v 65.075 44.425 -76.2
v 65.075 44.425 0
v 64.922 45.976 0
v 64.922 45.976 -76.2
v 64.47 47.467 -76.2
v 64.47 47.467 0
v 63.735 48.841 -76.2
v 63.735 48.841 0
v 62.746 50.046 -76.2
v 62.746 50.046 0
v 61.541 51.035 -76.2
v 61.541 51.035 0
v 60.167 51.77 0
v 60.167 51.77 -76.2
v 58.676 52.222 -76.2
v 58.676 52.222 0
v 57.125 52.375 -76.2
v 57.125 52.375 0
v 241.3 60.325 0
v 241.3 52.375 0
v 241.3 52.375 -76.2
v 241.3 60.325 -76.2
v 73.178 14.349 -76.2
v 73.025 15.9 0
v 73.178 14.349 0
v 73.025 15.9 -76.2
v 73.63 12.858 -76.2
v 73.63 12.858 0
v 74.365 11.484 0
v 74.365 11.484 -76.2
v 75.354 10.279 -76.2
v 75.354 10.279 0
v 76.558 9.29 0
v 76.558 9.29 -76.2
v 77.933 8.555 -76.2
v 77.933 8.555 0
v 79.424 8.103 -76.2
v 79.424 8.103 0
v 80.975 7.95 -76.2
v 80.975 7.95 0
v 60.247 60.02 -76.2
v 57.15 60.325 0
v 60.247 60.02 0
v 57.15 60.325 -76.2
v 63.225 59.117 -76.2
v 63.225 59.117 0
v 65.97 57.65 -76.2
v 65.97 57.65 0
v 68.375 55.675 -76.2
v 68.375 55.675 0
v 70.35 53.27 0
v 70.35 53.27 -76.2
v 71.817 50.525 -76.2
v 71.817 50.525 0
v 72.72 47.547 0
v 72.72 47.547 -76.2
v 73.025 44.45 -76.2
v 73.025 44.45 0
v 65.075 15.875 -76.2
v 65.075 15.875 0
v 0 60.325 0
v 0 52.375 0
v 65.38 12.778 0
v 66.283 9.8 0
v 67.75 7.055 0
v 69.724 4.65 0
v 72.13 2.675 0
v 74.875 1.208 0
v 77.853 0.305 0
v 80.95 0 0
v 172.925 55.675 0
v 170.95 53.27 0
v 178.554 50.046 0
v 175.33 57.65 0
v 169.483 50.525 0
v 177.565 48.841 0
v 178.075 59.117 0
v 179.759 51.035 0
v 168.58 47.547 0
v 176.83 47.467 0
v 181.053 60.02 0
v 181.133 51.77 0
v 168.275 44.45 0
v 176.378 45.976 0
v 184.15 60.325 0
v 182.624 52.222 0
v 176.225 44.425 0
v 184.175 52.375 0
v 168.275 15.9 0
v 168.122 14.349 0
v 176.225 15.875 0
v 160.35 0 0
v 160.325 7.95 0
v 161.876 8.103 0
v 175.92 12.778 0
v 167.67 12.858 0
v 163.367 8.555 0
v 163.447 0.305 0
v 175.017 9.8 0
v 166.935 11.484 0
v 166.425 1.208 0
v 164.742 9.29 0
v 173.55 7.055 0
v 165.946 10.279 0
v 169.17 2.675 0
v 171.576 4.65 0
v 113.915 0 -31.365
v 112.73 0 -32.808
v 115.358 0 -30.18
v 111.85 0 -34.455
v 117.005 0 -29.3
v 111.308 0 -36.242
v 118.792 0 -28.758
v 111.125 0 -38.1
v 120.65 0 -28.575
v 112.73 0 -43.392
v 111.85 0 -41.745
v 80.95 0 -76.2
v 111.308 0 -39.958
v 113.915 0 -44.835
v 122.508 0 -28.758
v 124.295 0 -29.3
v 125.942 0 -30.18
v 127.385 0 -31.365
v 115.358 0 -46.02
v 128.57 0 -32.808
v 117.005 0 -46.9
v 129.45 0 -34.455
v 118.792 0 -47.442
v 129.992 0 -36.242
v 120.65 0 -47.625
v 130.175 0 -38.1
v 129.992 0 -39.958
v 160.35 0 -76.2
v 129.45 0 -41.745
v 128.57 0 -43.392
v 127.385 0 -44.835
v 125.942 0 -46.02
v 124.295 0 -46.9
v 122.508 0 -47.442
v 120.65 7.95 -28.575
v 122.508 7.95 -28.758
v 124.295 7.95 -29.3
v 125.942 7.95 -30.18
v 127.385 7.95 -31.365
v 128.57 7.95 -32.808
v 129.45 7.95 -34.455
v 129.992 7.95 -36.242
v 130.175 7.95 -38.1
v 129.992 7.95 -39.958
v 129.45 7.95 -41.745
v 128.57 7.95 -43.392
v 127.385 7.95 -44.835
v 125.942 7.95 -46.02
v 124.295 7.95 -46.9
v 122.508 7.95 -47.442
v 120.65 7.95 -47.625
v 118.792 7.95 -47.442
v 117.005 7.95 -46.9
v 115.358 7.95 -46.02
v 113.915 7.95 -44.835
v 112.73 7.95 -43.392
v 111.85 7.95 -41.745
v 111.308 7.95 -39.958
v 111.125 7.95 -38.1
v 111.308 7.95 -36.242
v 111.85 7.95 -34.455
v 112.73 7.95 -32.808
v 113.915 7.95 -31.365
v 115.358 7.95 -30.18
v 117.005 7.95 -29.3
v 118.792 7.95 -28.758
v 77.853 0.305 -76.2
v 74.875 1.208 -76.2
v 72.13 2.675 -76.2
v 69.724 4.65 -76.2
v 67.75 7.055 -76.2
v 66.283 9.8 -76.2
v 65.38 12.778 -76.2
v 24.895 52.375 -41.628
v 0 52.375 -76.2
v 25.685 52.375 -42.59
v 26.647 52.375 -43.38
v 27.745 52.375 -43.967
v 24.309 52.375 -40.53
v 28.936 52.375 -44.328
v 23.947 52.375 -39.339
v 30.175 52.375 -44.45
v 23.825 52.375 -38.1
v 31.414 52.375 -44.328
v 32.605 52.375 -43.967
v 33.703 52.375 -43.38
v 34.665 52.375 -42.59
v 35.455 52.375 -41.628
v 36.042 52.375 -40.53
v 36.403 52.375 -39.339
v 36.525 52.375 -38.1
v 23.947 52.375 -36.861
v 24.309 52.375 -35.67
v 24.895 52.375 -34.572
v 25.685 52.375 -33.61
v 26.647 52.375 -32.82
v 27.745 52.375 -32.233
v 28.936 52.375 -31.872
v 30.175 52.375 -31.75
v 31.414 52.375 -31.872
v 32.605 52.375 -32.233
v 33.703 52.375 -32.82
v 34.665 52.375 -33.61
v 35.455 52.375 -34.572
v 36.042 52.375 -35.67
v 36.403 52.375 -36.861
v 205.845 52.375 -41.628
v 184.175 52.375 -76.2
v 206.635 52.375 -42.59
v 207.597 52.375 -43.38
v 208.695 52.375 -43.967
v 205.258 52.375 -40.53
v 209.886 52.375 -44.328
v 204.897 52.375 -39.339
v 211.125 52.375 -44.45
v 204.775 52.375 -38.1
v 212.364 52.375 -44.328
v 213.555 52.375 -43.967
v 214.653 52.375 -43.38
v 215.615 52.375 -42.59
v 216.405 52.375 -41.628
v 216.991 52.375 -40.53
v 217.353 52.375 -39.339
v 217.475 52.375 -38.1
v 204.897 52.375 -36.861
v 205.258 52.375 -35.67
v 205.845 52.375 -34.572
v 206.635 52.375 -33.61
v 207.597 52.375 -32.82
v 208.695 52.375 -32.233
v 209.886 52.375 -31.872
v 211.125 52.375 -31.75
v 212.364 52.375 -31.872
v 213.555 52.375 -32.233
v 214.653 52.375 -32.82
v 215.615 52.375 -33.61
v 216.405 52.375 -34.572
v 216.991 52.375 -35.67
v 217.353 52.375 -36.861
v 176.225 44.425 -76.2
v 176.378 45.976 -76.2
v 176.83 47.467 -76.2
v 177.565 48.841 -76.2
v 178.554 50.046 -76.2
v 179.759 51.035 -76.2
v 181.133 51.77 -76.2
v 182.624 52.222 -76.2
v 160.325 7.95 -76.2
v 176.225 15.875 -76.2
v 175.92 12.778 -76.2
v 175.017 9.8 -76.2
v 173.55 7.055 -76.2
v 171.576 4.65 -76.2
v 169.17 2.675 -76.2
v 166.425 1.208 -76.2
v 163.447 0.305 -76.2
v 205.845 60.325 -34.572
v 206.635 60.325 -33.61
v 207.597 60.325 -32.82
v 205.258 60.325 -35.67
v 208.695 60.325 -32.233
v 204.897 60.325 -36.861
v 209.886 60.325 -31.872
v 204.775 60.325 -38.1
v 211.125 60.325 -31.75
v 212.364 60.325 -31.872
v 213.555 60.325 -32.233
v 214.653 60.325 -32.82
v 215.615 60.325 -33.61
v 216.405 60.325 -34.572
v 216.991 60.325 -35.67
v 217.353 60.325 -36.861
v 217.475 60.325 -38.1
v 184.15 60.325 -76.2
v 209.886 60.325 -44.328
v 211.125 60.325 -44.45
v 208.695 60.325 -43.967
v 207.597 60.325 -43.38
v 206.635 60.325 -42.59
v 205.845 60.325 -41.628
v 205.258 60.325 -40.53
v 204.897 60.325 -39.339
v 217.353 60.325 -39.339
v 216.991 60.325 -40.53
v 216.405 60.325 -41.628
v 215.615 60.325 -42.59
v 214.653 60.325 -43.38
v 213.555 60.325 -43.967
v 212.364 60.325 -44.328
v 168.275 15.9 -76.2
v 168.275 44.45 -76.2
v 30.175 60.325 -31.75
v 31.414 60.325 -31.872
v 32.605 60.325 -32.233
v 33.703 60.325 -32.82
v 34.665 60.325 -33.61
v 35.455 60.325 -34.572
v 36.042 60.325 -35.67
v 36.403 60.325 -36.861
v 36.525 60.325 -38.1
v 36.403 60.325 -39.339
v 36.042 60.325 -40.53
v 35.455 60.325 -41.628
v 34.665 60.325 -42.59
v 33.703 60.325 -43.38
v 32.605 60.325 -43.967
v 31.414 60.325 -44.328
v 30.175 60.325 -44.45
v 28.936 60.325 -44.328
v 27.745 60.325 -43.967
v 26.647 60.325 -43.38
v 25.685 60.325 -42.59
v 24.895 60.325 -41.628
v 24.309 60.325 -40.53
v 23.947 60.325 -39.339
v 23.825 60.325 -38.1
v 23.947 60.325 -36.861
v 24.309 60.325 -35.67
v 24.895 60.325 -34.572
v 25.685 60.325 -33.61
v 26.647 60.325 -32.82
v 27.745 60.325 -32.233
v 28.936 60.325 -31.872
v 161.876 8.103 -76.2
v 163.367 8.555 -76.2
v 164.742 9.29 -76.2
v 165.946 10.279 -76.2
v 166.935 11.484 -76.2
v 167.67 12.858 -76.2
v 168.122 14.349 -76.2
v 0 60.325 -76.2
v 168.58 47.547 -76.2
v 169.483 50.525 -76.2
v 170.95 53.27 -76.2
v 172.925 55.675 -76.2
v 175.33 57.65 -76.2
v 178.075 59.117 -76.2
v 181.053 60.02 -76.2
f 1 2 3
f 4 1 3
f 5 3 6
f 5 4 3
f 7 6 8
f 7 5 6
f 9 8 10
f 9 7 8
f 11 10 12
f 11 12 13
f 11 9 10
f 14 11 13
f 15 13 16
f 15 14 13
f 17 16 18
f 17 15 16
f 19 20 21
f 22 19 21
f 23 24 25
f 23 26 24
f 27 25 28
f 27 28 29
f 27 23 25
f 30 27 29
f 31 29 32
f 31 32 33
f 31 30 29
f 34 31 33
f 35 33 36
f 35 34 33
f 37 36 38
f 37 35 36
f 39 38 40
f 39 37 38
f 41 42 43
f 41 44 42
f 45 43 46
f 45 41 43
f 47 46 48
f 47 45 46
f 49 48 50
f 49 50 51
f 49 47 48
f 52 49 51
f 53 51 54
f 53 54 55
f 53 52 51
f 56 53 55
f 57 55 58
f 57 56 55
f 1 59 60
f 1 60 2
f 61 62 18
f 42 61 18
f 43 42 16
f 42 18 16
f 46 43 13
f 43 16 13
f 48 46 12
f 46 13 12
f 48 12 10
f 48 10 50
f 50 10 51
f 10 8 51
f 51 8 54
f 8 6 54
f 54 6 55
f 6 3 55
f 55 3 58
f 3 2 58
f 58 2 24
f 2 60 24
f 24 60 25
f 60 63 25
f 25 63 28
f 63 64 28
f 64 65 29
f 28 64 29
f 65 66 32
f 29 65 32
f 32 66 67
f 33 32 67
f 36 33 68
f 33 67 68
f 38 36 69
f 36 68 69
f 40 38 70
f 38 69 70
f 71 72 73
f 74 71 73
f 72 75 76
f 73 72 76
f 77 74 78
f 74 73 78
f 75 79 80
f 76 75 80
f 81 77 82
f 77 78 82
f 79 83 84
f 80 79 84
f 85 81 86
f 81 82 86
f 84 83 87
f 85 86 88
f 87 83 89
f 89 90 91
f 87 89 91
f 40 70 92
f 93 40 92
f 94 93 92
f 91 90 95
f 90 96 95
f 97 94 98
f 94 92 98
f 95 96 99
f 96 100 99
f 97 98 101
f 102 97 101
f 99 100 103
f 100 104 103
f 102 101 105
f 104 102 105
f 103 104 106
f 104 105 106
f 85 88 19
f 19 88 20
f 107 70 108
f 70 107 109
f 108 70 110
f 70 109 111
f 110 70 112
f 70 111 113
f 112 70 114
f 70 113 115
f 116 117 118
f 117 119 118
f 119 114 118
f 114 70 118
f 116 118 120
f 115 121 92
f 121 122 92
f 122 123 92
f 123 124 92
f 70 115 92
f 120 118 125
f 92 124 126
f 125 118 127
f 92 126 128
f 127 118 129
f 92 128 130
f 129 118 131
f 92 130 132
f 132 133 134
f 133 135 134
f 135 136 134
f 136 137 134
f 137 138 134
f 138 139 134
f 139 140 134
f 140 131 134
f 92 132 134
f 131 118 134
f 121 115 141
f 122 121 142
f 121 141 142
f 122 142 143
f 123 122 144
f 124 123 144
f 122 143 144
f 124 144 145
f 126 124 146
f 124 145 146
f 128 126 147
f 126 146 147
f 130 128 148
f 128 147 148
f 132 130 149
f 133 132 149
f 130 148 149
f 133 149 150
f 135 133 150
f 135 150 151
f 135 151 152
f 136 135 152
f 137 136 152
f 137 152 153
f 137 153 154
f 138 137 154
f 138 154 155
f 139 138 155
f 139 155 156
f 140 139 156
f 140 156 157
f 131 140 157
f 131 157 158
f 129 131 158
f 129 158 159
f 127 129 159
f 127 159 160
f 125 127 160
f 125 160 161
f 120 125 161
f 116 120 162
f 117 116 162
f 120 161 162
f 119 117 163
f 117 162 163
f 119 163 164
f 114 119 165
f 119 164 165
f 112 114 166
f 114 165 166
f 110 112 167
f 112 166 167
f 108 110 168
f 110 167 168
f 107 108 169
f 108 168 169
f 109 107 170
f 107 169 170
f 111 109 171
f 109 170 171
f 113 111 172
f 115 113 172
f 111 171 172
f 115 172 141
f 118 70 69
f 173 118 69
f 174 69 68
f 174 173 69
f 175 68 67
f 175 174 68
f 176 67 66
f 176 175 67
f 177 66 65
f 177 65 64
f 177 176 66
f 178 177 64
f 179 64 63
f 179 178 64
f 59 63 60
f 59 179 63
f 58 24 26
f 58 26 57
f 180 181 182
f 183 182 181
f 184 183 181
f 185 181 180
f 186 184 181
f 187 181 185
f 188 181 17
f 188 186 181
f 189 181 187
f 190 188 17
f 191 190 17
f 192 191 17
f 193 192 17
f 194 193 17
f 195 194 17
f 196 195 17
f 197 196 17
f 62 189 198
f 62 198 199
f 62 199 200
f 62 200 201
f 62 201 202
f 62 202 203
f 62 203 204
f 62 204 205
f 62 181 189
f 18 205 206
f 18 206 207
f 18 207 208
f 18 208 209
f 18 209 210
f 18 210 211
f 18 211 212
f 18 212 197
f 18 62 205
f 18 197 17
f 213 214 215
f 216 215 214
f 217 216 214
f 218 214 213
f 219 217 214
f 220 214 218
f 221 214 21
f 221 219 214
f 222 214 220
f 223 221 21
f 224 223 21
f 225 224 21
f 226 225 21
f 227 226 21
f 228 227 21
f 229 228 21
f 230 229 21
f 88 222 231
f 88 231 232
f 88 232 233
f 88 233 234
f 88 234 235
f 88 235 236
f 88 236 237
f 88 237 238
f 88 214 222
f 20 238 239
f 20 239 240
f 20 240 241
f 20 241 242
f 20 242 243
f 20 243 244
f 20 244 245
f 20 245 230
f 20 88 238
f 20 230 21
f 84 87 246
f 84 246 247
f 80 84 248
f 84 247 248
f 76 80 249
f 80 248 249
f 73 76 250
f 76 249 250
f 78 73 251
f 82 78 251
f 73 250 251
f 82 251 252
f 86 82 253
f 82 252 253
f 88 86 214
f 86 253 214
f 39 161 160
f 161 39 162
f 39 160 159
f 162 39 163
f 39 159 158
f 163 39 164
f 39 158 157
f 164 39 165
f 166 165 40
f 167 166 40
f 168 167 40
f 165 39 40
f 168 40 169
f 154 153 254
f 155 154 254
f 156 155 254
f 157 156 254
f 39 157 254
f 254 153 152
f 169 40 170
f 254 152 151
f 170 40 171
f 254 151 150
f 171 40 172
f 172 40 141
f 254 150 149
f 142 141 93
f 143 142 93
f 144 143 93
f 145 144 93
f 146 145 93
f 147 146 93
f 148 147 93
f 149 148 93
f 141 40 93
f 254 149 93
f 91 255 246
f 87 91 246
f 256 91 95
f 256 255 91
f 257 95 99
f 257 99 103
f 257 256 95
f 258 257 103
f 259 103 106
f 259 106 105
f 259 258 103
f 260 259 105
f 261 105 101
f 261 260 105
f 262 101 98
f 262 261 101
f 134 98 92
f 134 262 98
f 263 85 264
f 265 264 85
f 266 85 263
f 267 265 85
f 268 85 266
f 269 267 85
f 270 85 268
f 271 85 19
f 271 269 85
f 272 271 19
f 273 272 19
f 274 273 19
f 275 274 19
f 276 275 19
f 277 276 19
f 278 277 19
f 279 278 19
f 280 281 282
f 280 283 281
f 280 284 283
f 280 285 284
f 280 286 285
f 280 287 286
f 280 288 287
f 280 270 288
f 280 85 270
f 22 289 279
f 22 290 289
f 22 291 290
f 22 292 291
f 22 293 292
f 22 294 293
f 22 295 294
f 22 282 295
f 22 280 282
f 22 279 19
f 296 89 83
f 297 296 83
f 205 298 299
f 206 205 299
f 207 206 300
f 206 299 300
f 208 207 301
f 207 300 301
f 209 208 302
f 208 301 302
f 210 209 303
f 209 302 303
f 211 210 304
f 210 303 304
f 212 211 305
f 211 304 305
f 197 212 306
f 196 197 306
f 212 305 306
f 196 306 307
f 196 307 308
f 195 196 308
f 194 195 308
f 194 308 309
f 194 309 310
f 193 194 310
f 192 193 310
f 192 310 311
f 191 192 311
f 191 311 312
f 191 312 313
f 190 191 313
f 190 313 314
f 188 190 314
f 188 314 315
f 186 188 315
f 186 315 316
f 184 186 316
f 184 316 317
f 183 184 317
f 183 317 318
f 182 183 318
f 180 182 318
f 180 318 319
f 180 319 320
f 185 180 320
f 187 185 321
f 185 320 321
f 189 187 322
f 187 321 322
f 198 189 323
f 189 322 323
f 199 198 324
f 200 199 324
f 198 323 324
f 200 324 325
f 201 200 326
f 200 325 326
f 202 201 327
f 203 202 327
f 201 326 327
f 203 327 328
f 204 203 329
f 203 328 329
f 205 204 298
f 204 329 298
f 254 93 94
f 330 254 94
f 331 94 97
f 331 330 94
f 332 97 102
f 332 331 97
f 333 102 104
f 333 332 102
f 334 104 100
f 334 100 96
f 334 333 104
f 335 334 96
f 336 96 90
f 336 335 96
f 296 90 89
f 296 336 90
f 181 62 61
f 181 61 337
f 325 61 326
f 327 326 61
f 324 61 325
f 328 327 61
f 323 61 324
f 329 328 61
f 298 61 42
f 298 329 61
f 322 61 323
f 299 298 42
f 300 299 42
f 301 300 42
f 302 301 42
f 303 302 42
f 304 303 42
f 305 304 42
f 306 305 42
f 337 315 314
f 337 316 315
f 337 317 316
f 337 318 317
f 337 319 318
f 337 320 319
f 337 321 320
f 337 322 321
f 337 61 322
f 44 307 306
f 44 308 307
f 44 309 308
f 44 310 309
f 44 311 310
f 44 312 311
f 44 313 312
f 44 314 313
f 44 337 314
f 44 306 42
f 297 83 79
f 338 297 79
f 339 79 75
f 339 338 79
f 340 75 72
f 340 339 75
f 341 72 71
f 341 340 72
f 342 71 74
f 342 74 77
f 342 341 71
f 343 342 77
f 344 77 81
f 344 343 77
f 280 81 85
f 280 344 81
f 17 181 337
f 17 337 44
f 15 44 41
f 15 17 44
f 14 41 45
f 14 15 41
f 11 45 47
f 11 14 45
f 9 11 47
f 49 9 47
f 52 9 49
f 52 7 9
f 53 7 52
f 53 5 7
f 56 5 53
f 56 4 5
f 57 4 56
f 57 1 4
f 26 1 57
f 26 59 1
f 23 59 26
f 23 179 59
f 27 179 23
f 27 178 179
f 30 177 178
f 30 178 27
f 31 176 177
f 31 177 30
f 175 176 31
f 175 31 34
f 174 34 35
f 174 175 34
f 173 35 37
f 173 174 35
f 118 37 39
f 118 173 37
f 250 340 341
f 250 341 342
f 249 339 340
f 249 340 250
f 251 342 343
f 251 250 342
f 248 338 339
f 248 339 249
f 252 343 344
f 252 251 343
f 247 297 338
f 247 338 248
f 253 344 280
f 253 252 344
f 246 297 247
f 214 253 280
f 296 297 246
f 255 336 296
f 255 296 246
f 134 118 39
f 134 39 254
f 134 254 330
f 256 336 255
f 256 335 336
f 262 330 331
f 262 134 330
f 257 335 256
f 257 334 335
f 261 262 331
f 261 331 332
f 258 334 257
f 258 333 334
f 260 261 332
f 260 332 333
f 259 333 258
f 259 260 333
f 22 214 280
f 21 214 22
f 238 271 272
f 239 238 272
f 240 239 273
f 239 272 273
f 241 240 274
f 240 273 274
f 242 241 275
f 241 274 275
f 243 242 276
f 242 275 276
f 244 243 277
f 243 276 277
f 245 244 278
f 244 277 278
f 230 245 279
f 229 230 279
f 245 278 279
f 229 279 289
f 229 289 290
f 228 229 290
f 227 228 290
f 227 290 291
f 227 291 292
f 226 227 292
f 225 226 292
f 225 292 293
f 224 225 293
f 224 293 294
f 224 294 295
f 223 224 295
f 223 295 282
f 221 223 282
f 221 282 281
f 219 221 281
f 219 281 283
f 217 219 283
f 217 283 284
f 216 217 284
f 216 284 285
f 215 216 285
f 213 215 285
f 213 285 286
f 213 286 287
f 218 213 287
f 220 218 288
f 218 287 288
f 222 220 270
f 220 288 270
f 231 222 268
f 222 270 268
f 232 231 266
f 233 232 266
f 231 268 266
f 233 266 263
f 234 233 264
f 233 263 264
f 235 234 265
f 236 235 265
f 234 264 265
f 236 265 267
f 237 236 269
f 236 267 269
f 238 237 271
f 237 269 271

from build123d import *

# Parameters (mm, degrees)
SKETCH1_W           = 241.3
SKETCH1_H           = 76.2
BOSS_EXTRUDE1_DEPTH = 60.325
SKETCH3_W           = 65.0748
SKETCH3_H           = 52.3748
CUT_EXTRUDE4_DEPTH  = 261.136955516
SKETCH6_W           = 95.25
SKETCH6_H           = 52.3748
CUT_EXTRUDE5_DEPTH  = 261.136955516
SKETCH7_W           = 65.0748
SKETCH7_H           = 52.3748
CUT_EXTRUDE6_DEPTH  = 261.136955516
SKETCH8_R           = 6.35
CUT_EXTRUDE7_DEPTH  = 261.136955516
SKETCH9_R           = 9.525
CUT_EXTRUDE8_DEPTH  = 261.136955516
FILLET1_R           = 15.875
FILLET2_R           = 7.9502
FILLET3_R           = 7.9502
FILLET4_R           = 15.875
FILLET5_R           = 15.875
FILLET6_R           = 15.875
FILLET7_R           = 7.9502
FILLET8_R           = 7.9502


with BuildPart() as part:
    # Sketch1 → Boss-Extrude1 (new body)
    with BuildSketch(Plane(origin=(0, 0, 0), x_dir=(1, 0, 0), z_dir=(0, 1, 0))):
        with Locations((120.65, 38.1)):
            Rectangle(SKETCH1_W, SKETCH1_H)
    extrude(amount=BOSS_EXTRUDE1_DEPTH)

    # Sketch3 → Cut-Extrude4 (cut, through all)
    with BuildSketch(Plane.XY):
        with Locations((208.7626, 26.1874)):
            Rectangle(SKETCH3_W, SKETCH3_H)
    extrude(amount=-CUT_EXTRUDE4_DEPTH, mode=Mode.SUBTRACT)

    # Sketch6 → Cut-Extrude5 (cut, through all)
    with BuildSketch(Plane.XY):
        with Locations((120.65, 34.1376)):
            Rectangle(SKETCH6_W, SKETCH6_H)
    extrude(amount=-CUT_EXTRUDE5_DEPTH, mode=Mode.SUBTRACT)

    # Sketch7 → Cut-Extrude6 (cut, through all)
    with BuildSketch(Plane.XY):
        with Locations((32.5374, 26.1874)):
            Rectangle(SKETCH7_W, SKETCH7_H)
    extrude(amount=-CUT_EXTRUDE6_DEPTH, mode=Mode.SUBTRACT)

    # Sketch8 → Cut-Extrude7 (cut, through all)
    with BuildSketch(Plane(origin=(0, 60.325, 0), x_dir=(1, 0, 0), z_dir=(0, 1, 0))):
        with Locations(Location((30.1752, 38.1, 0), (0, 0, 270))):
            Circle(SKETCH8_R)
        with Locations(Location((211.1248, 38.1, 0), (0, 0, 270))):
            Circle(SKETCH8_R)
    extrude(amount=-CUT_EXTRUDE7_DEPTH, mode=Mode.SUBTRACT)

    # Sketch9 → Cut-Extrude8 (cut, through all)
    with BuildSketch(Plane(origin=(0, 60.325, 0), x_dir=(1, 0, 0), z_dir=(0, 1, 0))):
        with Locations(Location((120.65, 38.1, 0), (0, 0, 270))):
            Circle(SKETCH9_R)
    extrude(amount=-CUT_EXTRUDE8_DEPTH, mode=Mode.SUBTRACT)

    # Fillet1
    fillet1_edges = [part.edges().sort_by_distance(p)[0] for p in [
        (73.025, 60.325, -38.1),
    ]]
    fillet(fillet1_edges, radius=FILLET1_R)

    # Fillet2
    fillet2_edges = [part.edges().sort_by_distance(p)[0] for p in [
        (73.025, 7.9502, -38.1),
    ]]
    fillet(fillet2_edges, radius=FILLET2_R)

    # Fillet3
    fillet3_edges = [part.edges().sort_by_distance(p)[0] for p in [
        (168.275, 7.9502, -38.1),
    ]]
    fillet(fillet3_edges, radius=FILLET3_R)

    # Fillet4
    fillet4_edges = [part.edges().sort_by_distance(p)[0] for p in [
        (168.275, 60.325, -38.1),
    ]]
    fillet(fillet4_edges, radius=FILLET4_R)

    # Fillet5
    fillet5_edges = [part.edges().sort_by_distance(p)[0] for p in [
        (176.2252, 0, -38.1),
    ]]
    fillet(fillet5_edges, radius=FILLET5_R)

    # Fillet6
    fillet6_edges = [part.edges().sort_by_distance(p)[0] for p in [
        (65.0748, 0, -38.1),
    ]]
    fillet(fillet6_edges, radius=FILLET6_R)

    # Fillet7
    fillet7_edges = [part.edges().sort_by_distance(p)[0] for p in [
        (65.0748, 52.3748, -38.1),
    ]]
    fillet(fillet7_edges, radius=FILLET7_R)

    # Fillet8
    fillet8_edges = [part.edges().sort_by_distance(p)[0] for p in [
        (176.2252, 52.3748, -38.1),
    ]]
    fillet(fillet8_edges, radius=FILLET8_R)


solid = part.part
